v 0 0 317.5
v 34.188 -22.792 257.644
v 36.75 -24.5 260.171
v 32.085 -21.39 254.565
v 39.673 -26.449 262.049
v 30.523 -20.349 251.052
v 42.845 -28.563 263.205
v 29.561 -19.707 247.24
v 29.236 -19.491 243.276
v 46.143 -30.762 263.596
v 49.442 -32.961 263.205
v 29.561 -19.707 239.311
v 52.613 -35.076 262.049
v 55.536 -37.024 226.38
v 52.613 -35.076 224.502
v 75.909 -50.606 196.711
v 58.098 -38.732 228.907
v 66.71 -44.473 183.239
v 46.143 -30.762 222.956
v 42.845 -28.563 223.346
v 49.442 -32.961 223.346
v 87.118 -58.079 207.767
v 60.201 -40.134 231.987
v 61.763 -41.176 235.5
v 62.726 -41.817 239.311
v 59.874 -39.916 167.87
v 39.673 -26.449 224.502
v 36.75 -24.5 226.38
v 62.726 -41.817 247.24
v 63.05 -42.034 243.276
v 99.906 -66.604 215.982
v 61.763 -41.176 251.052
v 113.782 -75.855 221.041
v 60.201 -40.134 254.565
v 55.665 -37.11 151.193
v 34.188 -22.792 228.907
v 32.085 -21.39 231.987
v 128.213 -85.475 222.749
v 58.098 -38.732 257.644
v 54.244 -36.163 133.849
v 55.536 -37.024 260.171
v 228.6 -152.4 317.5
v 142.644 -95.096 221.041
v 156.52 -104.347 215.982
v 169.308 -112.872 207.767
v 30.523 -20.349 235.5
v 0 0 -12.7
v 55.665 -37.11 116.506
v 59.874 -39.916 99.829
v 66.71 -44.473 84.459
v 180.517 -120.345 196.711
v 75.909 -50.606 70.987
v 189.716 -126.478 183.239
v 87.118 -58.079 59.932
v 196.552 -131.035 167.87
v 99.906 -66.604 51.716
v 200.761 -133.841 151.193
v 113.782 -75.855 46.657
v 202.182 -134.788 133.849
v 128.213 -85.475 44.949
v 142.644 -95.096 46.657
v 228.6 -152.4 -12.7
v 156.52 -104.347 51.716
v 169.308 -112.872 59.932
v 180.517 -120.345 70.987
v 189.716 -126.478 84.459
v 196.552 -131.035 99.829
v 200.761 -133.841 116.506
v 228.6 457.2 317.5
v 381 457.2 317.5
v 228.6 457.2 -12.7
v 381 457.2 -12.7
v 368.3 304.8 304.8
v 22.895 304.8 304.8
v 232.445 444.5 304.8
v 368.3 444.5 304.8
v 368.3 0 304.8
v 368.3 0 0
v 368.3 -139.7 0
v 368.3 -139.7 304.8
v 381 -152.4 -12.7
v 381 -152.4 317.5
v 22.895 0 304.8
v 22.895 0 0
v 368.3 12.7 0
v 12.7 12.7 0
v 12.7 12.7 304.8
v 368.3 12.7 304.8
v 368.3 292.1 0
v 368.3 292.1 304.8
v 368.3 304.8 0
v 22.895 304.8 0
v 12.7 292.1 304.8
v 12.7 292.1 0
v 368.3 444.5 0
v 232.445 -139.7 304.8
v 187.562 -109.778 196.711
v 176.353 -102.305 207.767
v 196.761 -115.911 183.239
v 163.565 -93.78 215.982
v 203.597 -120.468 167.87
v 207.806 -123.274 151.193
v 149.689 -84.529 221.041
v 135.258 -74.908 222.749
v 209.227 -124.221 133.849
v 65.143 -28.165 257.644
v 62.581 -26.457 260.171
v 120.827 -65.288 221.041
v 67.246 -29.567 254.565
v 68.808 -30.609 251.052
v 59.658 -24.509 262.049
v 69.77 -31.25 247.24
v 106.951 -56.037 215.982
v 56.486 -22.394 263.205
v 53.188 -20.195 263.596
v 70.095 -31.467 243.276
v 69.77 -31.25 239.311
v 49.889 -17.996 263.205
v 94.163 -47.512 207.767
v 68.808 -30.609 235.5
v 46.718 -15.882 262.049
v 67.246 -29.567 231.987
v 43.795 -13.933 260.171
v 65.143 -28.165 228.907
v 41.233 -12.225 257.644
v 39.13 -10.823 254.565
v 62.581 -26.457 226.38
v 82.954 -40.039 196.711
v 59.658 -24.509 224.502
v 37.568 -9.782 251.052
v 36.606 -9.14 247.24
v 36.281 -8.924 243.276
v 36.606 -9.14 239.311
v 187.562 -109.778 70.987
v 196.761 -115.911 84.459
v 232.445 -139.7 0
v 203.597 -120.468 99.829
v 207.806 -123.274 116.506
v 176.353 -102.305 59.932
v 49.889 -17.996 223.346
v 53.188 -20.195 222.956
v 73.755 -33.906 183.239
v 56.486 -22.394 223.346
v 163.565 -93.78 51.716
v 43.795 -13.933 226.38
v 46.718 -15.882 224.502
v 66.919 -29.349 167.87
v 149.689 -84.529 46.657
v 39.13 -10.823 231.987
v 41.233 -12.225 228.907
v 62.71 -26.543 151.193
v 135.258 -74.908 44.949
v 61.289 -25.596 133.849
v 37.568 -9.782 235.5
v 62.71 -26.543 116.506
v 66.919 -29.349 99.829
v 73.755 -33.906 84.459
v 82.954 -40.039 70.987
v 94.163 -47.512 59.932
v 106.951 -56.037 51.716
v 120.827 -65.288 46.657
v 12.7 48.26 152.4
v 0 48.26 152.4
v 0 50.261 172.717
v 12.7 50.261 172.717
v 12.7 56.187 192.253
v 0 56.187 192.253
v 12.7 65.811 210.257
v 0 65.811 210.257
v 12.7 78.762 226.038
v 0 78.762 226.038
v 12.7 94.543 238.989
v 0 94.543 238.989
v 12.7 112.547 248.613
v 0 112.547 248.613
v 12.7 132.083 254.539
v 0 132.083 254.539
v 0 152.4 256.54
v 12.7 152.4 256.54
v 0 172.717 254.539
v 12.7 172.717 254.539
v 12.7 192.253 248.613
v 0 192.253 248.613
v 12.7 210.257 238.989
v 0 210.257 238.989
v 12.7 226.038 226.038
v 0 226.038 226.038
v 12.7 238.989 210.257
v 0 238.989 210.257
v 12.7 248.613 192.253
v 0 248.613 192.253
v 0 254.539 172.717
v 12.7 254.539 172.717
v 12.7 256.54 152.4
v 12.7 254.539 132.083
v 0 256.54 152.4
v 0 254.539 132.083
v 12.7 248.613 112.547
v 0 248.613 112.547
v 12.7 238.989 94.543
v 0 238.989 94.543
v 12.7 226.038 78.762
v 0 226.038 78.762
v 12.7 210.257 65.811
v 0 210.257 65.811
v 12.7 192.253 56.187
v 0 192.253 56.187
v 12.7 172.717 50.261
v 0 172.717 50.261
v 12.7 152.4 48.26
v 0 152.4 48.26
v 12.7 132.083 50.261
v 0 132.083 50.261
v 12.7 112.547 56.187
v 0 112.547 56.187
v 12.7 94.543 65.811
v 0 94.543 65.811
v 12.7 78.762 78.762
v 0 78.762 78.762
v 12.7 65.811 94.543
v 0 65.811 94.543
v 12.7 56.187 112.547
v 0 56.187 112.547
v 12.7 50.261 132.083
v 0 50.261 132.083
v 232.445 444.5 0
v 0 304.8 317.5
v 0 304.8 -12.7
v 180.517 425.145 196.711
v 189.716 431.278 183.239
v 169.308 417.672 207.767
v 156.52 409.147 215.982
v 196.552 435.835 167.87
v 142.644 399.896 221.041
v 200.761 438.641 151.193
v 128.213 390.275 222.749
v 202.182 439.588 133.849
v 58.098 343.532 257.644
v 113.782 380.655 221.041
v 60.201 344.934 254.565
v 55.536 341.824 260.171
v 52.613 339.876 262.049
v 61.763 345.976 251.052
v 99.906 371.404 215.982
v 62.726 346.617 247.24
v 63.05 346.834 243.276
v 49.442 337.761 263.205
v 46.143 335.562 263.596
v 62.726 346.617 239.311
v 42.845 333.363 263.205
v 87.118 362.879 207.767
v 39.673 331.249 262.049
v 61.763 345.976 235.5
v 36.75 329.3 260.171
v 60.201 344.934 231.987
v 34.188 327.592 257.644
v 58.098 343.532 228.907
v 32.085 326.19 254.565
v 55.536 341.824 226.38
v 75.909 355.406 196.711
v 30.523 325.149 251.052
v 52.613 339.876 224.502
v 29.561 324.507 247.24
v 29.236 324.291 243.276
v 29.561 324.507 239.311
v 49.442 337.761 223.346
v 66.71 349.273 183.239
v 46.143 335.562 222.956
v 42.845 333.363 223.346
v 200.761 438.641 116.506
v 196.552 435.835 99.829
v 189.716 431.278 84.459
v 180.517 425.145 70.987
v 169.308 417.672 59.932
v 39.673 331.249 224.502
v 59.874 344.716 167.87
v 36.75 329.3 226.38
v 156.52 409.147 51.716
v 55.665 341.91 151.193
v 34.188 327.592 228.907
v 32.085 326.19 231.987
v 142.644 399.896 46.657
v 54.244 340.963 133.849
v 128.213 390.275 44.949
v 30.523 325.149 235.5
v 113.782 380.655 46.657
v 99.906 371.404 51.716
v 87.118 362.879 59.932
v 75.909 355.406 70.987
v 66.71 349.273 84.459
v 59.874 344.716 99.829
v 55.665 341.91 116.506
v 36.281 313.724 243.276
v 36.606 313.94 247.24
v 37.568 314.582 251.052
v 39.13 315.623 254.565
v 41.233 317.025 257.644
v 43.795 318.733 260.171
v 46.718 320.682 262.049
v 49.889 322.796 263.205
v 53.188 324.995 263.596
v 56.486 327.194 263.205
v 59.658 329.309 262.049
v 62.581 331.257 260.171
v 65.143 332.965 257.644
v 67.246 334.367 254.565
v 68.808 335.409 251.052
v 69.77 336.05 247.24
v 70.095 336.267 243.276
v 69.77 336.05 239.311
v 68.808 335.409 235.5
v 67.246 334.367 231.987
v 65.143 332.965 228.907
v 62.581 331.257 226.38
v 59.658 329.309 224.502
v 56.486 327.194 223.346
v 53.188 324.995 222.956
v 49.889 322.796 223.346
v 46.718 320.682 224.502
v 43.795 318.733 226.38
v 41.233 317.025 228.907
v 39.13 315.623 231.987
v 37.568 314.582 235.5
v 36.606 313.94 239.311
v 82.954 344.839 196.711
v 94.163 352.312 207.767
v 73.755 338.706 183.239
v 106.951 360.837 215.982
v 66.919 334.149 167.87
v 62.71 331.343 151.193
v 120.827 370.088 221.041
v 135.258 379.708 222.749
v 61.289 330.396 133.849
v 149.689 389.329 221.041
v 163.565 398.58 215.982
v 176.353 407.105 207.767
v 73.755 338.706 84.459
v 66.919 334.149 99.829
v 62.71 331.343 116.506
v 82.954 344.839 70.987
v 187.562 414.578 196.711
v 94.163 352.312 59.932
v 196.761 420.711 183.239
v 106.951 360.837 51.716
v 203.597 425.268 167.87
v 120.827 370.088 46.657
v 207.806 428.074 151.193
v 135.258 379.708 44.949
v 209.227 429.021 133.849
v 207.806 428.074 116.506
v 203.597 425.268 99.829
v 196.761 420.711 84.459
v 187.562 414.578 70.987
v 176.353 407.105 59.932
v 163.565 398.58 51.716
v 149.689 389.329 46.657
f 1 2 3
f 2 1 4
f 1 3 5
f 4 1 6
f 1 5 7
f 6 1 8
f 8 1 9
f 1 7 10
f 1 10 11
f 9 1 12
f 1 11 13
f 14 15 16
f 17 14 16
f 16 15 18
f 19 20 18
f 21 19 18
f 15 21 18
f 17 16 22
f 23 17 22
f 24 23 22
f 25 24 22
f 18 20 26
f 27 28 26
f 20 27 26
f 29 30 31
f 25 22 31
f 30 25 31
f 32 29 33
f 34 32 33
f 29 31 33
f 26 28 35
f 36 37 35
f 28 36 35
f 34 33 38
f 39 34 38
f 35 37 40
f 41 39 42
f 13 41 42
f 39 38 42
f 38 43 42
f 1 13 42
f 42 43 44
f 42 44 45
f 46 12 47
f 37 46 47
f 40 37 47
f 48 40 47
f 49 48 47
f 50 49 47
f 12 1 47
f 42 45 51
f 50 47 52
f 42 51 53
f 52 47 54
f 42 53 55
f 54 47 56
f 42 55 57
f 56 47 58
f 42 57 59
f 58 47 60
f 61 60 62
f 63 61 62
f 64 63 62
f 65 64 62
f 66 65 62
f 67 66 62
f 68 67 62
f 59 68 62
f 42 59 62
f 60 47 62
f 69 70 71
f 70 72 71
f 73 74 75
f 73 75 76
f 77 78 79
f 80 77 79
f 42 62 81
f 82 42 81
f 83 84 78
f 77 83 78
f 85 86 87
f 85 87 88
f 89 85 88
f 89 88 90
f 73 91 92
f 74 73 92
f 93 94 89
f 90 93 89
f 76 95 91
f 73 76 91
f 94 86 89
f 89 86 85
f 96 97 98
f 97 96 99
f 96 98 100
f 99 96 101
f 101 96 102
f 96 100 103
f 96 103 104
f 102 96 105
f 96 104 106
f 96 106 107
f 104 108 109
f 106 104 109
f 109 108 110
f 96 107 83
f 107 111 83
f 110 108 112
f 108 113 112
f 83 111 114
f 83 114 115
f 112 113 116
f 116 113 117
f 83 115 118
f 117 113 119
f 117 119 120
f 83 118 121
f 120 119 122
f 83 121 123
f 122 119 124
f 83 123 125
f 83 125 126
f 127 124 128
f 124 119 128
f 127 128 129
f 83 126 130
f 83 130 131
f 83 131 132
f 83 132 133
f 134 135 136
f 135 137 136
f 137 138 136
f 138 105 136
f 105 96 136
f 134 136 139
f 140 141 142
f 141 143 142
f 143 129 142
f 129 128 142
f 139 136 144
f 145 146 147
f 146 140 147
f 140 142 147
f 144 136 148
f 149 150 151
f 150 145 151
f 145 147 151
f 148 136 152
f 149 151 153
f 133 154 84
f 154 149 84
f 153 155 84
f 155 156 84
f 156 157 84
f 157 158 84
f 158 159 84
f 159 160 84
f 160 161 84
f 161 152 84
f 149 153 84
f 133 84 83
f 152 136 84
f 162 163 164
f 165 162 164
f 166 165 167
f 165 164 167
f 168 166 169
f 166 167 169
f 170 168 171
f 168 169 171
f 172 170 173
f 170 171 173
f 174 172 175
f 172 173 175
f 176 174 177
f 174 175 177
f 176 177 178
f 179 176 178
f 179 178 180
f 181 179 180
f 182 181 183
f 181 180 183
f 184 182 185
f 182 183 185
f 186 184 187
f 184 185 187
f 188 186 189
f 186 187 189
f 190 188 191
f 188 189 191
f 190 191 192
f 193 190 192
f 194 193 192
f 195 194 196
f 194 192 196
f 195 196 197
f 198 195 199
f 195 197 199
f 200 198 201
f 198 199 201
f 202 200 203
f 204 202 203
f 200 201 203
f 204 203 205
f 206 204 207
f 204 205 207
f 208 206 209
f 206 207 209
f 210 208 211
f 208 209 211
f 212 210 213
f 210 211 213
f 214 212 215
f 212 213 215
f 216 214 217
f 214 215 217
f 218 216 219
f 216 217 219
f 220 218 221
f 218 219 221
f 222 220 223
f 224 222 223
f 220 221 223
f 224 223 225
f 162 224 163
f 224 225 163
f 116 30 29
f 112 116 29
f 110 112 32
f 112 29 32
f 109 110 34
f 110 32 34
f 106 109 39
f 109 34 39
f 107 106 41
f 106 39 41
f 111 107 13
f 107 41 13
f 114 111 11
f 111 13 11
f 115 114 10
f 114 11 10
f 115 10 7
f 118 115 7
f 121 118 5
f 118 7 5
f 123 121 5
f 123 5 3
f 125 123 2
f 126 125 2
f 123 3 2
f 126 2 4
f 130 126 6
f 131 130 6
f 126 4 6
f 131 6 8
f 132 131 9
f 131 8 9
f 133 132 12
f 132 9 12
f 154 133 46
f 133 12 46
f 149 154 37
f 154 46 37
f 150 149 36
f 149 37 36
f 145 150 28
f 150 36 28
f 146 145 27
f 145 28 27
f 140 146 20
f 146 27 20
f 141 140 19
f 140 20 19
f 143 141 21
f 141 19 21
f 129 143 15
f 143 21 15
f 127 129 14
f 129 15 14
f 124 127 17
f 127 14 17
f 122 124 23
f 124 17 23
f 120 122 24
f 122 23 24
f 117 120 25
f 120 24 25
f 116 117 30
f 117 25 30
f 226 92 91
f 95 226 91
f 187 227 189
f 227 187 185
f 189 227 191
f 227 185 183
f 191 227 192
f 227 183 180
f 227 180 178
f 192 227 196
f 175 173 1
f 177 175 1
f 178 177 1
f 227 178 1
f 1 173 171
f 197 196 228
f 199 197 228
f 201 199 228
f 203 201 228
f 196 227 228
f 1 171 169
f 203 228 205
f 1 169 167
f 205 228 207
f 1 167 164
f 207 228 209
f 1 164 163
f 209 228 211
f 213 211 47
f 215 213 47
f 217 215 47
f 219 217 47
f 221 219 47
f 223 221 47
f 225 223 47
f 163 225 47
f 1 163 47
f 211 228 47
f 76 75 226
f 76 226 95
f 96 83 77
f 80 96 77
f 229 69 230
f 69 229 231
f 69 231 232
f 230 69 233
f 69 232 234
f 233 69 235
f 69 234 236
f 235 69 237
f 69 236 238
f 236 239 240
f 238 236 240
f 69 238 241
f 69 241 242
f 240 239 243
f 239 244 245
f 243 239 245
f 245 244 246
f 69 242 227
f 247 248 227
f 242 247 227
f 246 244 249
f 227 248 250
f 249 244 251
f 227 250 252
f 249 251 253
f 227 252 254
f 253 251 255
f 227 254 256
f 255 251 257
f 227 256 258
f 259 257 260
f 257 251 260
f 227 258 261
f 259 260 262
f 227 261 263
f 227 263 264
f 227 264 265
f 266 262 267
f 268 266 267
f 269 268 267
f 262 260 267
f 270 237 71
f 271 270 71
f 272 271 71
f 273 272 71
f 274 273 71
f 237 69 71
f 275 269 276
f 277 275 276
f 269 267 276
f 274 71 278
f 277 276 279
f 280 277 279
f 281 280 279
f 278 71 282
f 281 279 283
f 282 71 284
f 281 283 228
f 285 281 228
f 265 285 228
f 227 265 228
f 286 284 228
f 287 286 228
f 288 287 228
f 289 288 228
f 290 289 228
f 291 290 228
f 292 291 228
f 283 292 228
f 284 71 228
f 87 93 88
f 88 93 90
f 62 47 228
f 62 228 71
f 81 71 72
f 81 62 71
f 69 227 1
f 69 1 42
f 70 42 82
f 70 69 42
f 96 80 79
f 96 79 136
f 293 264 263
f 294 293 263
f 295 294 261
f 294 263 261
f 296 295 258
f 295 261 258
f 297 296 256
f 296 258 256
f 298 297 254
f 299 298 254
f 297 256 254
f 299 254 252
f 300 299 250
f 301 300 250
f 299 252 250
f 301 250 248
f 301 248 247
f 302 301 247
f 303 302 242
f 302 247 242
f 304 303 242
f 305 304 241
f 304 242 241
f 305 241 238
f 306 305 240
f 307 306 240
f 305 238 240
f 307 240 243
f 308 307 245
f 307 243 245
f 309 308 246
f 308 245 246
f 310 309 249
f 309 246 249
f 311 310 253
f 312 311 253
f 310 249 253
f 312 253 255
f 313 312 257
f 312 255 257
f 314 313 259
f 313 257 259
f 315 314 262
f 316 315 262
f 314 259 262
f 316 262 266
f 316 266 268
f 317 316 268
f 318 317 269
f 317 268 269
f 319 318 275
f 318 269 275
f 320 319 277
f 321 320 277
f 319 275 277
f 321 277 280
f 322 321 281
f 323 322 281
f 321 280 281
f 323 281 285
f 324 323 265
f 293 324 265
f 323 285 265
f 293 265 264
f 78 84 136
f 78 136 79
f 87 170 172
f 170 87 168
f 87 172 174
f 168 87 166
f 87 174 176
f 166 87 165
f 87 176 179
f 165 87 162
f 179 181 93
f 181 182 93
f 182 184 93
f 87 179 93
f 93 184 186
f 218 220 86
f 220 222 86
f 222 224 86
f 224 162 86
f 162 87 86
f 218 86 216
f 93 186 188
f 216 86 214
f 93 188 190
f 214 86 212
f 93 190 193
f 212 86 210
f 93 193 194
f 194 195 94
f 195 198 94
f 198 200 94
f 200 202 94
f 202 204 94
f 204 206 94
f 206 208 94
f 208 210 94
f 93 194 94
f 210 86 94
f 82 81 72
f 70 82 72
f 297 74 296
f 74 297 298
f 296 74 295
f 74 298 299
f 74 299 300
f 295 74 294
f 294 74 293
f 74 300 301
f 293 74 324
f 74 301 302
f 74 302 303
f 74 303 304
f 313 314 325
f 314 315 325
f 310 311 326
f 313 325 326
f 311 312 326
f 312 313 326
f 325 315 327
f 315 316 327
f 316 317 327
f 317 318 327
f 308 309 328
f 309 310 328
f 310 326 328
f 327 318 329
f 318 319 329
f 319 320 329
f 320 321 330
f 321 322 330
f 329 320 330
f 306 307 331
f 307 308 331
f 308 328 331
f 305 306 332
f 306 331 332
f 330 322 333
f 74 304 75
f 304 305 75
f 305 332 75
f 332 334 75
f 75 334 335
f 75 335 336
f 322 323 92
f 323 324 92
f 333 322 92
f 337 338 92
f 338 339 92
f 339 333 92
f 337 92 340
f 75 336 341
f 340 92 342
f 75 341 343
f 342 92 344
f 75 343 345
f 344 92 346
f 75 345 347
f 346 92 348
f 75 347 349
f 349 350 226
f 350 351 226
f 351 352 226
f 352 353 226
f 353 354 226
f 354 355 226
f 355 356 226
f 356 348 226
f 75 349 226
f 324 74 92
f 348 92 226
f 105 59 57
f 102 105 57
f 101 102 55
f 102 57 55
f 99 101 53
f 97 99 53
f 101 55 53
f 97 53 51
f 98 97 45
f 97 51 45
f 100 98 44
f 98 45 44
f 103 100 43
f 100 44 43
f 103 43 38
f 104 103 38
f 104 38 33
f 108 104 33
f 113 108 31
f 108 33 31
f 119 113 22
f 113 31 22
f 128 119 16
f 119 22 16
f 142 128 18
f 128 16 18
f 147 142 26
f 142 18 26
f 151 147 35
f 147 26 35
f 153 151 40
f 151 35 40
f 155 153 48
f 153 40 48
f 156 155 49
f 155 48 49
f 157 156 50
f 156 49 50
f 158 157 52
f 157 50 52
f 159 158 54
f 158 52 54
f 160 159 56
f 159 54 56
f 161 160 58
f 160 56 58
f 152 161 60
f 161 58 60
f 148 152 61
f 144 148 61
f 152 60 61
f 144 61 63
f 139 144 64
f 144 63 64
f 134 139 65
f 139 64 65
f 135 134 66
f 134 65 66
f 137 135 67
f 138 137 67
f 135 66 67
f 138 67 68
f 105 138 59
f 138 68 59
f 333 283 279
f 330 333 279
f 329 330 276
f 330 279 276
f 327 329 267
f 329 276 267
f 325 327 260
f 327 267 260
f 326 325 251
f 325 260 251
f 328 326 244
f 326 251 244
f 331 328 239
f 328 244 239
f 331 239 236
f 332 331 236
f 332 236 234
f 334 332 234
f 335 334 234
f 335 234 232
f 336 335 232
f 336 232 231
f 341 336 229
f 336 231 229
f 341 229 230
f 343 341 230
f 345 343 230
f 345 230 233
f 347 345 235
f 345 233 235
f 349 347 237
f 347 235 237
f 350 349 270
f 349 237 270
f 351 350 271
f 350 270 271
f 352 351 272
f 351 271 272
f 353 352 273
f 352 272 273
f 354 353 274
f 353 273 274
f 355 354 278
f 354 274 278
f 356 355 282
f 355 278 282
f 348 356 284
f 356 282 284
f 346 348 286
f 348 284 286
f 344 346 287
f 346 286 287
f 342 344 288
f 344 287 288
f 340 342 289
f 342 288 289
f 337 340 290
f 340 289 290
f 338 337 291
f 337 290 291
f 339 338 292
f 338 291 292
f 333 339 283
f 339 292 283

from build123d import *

# Parameters (mm, degrees)
F0_W      = 355.6000034809
F0_H      = 279.4000034809
F1_DEPTH  = 304.8
F2_R      = 104.14
F3_DEPTH  = 12.6999982595
F4_R      = 88.9
F4_R_2    = 20.32
F5_DEPTH  = 12.7
F6_R      = 88.9
F6_R_2    = 20.32
F7_DEPTH  = 12.7
F9_DEPTH  = 12.7
F11_DEPTH = 12.7


with BuildPart() as f1:
    # F0 (on Top) → F1 (new body)
    with BuildSketch(Plane.XY):
        Polygon((0, 304.8), (0, 0), (22.8952505992, 0), (368.3, 0), (381, 0), (381, 304.8), (368.3, 304.8), (22.8952505992, 304.8), align=None)
        with Locations((190.5, 152.4)):
            Rectangle(F0_W, F0_H, mode=Mode.SUBTRACT)
        Polygon((22.8952505992, 0), (0, 0), (228.6, -152.4), (381, -152.4), (381, 0), (368.3, 0), (368.3, -139.7), (232.4452505992, -139.7), align=None)
        Polygon((228.6, 457.2), (0, 304.8), (22.8952505992, 304.8), (232.4452505992, 444.5), (368.3, 444.5), (368.3, 304.8), (381, 304.8), (381, 457.2), align=None)
    extrude(amount=F1_DEPTH)

    # F2 (on face) → F3 (cut, through all)
    with BuildSketch(Plane(origin=(0, 0, 0), x_dir=(0, -1, 0), z_dir=(-1, 0, 0))):
        with Locations((-152.4, 152.4)):
            Circle(F2_R)
    extrude(amount=-F3_DEPTH, mode=Mode.SUBTRACT)

    # F4 (on face) → F5 (cut, through all)
    with BuildSketch(Plane(origin=(-140.6769230769, 211.0153846154, 0), x_dir=(-0.8320502943, -0.5547001962, 0), z_dir=(-0.5547001962, 0.8320502943, 0))):
        with Locations((-323.1656269998, 133.8491573491)):
            Circle(F4_R)
        with Locations((-224.529868778, 243.2757062301)):
            Circle(F4_R_2)
    extrude(amount=-F5_DEPTH, mode=Mode.SUBTRACT)

    # F6 (on face) → F7 (cut, through all)
    with BuildSketch(Plane(origin=(0, 0, 0), x_dir=(0.8320502943, -0.5547001962, 0), z_dir=(-0.5547001962, -0.8320502943, 0))):
        with Locations((154.0930071904, 133.8491573491)):
            Circle(F6_R)
        with Locations((55.4572489685, 243.2757062301)):
            Circle(F6_R_2)
    extrude(amount=-F7_DEPTH, mode=Mode.SUBTRACT)

    # F8 (on face) → F9 (join)
    with BuildSketch(Plane(origin=(0, 0, 0), x_dir=(1, 0, 0), z_dir=(0, 0, -1))):
        Polygon((381, -457.2), (381, 152.4), (228.6, 152.4), (0, 0), (0, -304.8), (228.6, -457.2), align=None)
    extrude(amount=F9_DEPTH)

    # F10 (on face) → F11 (join)
    with BuildSketch(Plane.XY.offset(304.8)):
        Polygon((381, -152.4), (381, 457.2), (228.6, 457.2), (0, 304.8), (0, 0), (228.6, -152.4), align=None)
    extrude(amount=F11_DEPTH)


solid = f1.part
